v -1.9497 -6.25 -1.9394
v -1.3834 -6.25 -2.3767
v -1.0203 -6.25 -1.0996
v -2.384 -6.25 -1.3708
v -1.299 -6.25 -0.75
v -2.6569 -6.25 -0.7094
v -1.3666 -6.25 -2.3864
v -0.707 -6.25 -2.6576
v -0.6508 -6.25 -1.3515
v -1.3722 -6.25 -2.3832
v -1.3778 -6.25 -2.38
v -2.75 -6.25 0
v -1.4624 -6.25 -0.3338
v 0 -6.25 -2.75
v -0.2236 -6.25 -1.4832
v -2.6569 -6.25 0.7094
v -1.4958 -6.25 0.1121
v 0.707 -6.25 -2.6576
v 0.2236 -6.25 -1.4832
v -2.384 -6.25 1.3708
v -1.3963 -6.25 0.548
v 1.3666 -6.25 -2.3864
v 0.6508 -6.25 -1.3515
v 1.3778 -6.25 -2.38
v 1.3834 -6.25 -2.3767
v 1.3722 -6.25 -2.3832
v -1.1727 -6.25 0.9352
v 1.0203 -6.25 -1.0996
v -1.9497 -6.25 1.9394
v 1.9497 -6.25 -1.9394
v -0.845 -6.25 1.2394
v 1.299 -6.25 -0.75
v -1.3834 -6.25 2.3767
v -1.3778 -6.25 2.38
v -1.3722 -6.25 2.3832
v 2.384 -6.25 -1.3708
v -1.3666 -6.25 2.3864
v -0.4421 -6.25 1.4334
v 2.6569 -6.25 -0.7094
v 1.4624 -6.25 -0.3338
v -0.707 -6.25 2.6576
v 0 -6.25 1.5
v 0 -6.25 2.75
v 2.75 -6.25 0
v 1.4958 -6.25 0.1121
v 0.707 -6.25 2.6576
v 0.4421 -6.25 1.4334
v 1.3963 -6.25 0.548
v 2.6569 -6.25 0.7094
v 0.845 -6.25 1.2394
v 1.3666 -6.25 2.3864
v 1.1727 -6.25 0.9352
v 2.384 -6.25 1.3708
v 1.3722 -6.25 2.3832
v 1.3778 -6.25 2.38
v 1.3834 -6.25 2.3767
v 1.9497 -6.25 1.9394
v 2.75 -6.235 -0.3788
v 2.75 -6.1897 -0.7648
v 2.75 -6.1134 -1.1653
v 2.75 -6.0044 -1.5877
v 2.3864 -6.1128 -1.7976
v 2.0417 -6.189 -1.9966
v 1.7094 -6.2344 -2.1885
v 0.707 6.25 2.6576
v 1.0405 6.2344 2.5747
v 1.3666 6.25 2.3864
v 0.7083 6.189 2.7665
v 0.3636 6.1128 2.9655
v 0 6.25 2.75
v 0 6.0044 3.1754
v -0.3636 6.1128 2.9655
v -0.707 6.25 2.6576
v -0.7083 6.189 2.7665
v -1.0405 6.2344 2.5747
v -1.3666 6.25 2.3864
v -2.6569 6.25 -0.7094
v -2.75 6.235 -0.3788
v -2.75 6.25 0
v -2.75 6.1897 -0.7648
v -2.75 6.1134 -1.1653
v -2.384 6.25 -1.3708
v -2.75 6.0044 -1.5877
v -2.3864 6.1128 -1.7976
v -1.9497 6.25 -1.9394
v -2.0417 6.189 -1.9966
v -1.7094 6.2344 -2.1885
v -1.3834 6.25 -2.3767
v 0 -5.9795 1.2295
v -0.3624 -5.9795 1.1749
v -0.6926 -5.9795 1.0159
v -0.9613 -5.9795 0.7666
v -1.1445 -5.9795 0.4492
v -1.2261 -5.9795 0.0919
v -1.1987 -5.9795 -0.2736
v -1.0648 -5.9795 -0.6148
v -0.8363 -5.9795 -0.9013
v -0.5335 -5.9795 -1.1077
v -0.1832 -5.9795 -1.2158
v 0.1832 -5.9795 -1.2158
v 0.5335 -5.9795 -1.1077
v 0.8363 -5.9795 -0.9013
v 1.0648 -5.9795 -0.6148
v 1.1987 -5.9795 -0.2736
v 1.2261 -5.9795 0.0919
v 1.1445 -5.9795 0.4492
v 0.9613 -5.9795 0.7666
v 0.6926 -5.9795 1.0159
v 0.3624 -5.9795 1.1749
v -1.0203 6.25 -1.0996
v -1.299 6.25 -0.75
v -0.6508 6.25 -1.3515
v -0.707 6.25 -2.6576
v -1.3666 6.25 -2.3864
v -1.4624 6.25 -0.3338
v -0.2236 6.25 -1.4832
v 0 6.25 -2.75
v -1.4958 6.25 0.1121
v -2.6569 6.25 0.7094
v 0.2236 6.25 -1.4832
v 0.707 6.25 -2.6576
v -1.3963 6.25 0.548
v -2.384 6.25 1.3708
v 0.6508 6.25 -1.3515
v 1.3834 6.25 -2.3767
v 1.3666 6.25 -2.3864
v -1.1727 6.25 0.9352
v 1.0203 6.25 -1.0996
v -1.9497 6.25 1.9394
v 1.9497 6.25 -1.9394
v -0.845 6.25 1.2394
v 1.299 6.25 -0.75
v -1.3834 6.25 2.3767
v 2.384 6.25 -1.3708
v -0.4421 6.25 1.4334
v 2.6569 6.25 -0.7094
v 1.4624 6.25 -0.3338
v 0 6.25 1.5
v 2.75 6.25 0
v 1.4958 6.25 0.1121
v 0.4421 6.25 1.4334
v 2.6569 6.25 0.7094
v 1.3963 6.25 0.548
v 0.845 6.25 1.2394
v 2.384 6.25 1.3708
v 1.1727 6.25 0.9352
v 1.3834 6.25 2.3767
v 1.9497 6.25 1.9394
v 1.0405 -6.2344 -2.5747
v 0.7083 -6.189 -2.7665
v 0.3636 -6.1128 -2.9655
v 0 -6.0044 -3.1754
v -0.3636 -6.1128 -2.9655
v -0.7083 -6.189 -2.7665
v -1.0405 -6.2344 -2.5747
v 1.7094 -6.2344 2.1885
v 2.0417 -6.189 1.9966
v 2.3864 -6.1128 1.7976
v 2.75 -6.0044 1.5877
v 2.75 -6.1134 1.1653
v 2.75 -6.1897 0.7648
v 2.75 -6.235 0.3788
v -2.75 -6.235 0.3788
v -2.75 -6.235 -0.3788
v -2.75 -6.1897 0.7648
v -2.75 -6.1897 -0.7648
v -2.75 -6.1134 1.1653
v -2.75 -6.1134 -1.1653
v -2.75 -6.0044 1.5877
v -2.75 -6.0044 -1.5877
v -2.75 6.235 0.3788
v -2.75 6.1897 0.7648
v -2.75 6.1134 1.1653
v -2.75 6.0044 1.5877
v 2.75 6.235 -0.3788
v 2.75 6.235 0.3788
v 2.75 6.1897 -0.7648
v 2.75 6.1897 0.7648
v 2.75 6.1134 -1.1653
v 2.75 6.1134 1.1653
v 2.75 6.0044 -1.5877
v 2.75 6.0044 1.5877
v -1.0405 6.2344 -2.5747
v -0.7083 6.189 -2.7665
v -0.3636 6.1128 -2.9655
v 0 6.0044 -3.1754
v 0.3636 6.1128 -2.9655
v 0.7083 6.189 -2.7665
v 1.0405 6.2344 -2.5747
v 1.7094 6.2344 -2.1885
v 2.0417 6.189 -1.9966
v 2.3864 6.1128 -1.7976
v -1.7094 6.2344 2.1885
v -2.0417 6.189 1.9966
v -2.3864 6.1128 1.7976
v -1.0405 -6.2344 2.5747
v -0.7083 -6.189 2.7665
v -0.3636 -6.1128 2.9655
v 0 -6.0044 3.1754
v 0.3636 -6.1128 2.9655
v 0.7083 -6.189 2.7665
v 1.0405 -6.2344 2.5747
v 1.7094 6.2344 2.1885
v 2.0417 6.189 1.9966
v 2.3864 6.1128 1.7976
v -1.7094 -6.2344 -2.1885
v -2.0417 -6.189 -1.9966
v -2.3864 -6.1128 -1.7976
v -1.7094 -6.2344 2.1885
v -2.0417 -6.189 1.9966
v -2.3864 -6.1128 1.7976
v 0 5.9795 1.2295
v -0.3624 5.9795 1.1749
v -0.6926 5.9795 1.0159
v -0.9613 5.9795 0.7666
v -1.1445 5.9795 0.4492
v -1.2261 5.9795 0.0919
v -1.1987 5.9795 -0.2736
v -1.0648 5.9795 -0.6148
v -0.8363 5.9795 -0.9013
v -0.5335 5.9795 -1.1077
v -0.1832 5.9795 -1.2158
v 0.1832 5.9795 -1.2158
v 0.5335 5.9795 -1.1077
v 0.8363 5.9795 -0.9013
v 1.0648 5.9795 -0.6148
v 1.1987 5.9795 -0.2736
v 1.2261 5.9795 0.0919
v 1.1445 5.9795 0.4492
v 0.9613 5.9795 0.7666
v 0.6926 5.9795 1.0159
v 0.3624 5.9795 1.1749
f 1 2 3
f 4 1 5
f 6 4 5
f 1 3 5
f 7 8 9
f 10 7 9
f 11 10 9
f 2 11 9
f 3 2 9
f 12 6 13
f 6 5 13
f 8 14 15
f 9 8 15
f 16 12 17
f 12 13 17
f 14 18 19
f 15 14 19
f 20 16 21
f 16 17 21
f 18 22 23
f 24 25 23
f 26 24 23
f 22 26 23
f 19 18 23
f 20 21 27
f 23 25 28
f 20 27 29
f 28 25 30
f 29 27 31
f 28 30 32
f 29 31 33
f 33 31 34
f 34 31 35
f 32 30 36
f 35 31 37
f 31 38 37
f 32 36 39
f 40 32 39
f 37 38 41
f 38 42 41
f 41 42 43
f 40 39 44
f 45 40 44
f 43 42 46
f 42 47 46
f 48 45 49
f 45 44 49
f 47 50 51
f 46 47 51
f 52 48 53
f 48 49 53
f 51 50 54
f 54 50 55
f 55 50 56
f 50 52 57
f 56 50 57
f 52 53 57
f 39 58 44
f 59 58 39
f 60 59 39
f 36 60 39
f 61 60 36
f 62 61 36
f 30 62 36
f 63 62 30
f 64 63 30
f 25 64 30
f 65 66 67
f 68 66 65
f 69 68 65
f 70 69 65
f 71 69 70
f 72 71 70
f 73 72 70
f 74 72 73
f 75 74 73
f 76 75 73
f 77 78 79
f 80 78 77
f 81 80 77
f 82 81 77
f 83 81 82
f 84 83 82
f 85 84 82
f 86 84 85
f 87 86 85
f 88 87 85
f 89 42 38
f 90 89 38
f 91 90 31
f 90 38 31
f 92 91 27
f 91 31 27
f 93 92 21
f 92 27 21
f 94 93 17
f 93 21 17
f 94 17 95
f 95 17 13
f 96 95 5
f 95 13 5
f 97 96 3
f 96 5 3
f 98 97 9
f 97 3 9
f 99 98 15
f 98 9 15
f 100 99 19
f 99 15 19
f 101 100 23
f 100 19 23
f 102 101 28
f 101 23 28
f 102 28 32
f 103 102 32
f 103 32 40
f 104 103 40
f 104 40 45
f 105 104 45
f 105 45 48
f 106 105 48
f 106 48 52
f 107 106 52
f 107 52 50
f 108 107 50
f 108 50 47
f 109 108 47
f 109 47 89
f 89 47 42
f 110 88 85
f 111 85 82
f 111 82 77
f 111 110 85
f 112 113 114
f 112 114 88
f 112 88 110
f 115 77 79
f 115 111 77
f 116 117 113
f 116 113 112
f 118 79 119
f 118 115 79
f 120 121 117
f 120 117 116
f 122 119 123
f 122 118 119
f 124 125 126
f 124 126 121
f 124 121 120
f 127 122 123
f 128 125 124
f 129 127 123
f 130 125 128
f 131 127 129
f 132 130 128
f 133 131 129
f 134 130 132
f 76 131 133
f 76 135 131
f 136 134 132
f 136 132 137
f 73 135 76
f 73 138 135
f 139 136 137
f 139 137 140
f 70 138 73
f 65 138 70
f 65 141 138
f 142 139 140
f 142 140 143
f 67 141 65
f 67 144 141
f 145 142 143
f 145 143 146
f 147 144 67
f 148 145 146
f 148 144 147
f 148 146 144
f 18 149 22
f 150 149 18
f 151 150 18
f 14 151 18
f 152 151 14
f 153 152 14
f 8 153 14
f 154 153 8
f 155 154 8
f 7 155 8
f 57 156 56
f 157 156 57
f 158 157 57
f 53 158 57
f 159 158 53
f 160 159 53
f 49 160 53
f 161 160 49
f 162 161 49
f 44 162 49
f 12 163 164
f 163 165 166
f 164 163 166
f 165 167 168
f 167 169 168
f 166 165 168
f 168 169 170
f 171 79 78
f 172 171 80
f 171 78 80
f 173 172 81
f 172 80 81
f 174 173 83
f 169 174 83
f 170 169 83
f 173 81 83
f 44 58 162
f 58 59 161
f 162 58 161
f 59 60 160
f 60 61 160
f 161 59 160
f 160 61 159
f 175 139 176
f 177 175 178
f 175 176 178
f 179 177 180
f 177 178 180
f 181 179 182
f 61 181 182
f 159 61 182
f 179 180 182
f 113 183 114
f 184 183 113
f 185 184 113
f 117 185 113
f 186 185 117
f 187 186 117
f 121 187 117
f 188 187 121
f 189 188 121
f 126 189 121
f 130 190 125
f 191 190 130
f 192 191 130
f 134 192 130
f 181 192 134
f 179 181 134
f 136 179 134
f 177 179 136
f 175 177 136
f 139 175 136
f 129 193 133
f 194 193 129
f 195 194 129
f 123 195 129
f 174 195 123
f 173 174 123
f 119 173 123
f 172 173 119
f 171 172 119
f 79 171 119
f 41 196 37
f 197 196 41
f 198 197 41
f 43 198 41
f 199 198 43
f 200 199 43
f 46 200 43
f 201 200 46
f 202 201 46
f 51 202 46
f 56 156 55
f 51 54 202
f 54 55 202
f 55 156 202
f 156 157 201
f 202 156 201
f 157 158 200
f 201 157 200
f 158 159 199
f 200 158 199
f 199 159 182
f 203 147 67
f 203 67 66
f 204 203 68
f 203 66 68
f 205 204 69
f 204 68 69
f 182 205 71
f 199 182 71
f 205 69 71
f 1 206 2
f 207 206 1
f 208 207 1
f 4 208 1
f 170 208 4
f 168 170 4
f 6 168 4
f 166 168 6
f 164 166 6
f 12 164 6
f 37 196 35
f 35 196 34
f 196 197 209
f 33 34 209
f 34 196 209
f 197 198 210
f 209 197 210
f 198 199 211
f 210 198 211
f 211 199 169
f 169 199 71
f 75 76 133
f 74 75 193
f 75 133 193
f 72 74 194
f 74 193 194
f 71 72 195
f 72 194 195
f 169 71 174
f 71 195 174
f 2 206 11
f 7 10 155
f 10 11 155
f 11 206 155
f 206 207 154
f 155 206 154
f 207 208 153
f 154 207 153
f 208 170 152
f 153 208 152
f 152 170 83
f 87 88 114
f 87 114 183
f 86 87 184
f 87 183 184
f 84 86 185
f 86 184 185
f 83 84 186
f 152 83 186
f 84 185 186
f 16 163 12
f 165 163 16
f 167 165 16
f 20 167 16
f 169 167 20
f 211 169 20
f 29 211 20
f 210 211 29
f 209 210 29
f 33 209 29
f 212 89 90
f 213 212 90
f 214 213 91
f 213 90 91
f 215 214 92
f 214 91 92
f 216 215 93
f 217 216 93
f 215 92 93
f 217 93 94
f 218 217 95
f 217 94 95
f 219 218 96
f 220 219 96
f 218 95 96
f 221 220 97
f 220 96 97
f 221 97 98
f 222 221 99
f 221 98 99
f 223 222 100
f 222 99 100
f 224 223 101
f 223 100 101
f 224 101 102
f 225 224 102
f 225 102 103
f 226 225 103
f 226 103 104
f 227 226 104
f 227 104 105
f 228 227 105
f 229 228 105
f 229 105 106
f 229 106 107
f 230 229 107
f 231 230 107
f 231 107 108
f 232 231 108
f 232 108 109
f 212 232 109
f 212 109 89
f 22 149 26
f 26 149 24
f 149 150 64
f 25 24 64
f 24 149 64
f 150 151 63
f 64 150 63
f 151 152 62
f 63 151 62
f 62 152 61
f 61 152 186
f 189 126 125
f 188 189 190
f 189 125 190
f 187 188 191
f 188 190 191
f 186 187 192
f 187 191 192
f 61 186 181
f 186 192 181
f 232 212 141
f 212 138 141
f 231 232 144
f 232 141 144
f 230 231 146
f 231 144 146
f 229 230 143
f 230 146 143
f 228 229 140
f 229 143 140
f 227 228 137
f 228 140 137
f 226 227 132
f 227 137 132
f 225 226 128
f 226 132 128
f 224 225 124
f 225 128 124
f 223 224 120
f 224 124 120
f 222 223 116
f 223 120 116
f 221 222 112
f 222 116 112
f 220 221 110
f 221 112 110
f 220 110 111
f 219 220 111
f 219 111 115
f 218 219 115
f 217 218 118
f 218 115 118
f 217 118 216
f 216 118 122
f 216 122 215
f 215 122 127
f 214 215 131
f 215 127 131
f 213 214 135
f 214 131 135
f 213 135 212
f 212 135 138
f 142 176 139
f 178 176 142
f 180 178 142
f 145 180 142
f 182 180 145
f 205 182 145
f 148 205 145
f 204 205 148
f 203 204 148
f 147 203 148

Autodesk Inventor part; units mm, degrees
ref_plane "YZ Plane" through (0, 0, 0) normal (1, 0, 0) x (0, 1, 0)
ref_plane "XZ Plane" through (0, 0, 0) normal (0, 1, 0) x (-1, 0, 0)
ref_plane "XY Plane" through (0, 0, 0) normal (0, 0, 1) x (1, 0, 0)
sketch "スケッチ1" plane through (0, 0, 0) normal (1, 0, 0) x (0, 1, 0)
  line L0 (-6.25, 0) -> (6.25, 0)
  line L1 (0, 0) -> (0, 3.1754) construction
  line L2 (-6.0044, 3.1754) -> (-6.25, 2.75)
  line L3 (-6.25, 2.75) -> (-6.25, 0)
  line L4 (-6.0044, 3.1754) -> (6.0044, 3.1754)
  line L5 (6.0044, 3.1754) -> (6.25, 2.75)
  line L6 (6.25, 2.75) -> (6.25, 0)
  dimension "d1" = 2.75
  dimension "d2" = 3.1754
  dimension "d3" = 30
  dimension "d4" = 12.5
revolve "回転1" add sketch "スケッチ1" angle 360 about axis through (0, -6.25, 0) along (0, 1, 0)
sketch "スケッチ2" plane through (0, 6.25, 0) normal (0, 1, 0) x (1, 0, 0)
  line L0 (0, -3.1754) -> (-2.75, -1.5877)
  line L1 (-2.75, -1.5877) -> (-2.75, 1.5877)
  line L2 (-2.75, 1.5877) -> (0, 3.1754)
  line L3 (0, 3.1754) -> (2.75, 1.5877)
  line L4 (2.75, 1.5877) -> (2.75, -1.5877)
  line L5 (2.75, -1.5877) -> (0, -3.1754)
  circle A0 centre (0, 0) radius 3.1754 projected
  point P0 (0, 0)
  point P1 (0, 0)
  point P2 (0, 0)
  point P3 (0, 0)
  point P4 (0, 3.1754)
  point P5 (0, 3.1754)
  point P6 (2.75, -1.5877)
  point P7 (2.75, -1.5877)
extrude "押し出し1" cut sketch "スケッチ2" against normal through all contours A0 L0 | L5 A0 | A0 L1 | L4 A0 | A0 L2 | L3 A0
hole "穴1" at (0, 6.25, 0) direction (0, -1, 0) diameter 2.459 end through all countersink diameter 3 countersink angle 90 thread size "M3x0.5" class "6H" standard "ISO Metric profile"
mirror "ミラー1" about plane through (0, 0, 0) normal (0, 1, 0) of "穴1"
equation "\"d2\" = 1.1547 * d1"
properties part number "AS-312.5B" material "アセタール樹脂、黒"
